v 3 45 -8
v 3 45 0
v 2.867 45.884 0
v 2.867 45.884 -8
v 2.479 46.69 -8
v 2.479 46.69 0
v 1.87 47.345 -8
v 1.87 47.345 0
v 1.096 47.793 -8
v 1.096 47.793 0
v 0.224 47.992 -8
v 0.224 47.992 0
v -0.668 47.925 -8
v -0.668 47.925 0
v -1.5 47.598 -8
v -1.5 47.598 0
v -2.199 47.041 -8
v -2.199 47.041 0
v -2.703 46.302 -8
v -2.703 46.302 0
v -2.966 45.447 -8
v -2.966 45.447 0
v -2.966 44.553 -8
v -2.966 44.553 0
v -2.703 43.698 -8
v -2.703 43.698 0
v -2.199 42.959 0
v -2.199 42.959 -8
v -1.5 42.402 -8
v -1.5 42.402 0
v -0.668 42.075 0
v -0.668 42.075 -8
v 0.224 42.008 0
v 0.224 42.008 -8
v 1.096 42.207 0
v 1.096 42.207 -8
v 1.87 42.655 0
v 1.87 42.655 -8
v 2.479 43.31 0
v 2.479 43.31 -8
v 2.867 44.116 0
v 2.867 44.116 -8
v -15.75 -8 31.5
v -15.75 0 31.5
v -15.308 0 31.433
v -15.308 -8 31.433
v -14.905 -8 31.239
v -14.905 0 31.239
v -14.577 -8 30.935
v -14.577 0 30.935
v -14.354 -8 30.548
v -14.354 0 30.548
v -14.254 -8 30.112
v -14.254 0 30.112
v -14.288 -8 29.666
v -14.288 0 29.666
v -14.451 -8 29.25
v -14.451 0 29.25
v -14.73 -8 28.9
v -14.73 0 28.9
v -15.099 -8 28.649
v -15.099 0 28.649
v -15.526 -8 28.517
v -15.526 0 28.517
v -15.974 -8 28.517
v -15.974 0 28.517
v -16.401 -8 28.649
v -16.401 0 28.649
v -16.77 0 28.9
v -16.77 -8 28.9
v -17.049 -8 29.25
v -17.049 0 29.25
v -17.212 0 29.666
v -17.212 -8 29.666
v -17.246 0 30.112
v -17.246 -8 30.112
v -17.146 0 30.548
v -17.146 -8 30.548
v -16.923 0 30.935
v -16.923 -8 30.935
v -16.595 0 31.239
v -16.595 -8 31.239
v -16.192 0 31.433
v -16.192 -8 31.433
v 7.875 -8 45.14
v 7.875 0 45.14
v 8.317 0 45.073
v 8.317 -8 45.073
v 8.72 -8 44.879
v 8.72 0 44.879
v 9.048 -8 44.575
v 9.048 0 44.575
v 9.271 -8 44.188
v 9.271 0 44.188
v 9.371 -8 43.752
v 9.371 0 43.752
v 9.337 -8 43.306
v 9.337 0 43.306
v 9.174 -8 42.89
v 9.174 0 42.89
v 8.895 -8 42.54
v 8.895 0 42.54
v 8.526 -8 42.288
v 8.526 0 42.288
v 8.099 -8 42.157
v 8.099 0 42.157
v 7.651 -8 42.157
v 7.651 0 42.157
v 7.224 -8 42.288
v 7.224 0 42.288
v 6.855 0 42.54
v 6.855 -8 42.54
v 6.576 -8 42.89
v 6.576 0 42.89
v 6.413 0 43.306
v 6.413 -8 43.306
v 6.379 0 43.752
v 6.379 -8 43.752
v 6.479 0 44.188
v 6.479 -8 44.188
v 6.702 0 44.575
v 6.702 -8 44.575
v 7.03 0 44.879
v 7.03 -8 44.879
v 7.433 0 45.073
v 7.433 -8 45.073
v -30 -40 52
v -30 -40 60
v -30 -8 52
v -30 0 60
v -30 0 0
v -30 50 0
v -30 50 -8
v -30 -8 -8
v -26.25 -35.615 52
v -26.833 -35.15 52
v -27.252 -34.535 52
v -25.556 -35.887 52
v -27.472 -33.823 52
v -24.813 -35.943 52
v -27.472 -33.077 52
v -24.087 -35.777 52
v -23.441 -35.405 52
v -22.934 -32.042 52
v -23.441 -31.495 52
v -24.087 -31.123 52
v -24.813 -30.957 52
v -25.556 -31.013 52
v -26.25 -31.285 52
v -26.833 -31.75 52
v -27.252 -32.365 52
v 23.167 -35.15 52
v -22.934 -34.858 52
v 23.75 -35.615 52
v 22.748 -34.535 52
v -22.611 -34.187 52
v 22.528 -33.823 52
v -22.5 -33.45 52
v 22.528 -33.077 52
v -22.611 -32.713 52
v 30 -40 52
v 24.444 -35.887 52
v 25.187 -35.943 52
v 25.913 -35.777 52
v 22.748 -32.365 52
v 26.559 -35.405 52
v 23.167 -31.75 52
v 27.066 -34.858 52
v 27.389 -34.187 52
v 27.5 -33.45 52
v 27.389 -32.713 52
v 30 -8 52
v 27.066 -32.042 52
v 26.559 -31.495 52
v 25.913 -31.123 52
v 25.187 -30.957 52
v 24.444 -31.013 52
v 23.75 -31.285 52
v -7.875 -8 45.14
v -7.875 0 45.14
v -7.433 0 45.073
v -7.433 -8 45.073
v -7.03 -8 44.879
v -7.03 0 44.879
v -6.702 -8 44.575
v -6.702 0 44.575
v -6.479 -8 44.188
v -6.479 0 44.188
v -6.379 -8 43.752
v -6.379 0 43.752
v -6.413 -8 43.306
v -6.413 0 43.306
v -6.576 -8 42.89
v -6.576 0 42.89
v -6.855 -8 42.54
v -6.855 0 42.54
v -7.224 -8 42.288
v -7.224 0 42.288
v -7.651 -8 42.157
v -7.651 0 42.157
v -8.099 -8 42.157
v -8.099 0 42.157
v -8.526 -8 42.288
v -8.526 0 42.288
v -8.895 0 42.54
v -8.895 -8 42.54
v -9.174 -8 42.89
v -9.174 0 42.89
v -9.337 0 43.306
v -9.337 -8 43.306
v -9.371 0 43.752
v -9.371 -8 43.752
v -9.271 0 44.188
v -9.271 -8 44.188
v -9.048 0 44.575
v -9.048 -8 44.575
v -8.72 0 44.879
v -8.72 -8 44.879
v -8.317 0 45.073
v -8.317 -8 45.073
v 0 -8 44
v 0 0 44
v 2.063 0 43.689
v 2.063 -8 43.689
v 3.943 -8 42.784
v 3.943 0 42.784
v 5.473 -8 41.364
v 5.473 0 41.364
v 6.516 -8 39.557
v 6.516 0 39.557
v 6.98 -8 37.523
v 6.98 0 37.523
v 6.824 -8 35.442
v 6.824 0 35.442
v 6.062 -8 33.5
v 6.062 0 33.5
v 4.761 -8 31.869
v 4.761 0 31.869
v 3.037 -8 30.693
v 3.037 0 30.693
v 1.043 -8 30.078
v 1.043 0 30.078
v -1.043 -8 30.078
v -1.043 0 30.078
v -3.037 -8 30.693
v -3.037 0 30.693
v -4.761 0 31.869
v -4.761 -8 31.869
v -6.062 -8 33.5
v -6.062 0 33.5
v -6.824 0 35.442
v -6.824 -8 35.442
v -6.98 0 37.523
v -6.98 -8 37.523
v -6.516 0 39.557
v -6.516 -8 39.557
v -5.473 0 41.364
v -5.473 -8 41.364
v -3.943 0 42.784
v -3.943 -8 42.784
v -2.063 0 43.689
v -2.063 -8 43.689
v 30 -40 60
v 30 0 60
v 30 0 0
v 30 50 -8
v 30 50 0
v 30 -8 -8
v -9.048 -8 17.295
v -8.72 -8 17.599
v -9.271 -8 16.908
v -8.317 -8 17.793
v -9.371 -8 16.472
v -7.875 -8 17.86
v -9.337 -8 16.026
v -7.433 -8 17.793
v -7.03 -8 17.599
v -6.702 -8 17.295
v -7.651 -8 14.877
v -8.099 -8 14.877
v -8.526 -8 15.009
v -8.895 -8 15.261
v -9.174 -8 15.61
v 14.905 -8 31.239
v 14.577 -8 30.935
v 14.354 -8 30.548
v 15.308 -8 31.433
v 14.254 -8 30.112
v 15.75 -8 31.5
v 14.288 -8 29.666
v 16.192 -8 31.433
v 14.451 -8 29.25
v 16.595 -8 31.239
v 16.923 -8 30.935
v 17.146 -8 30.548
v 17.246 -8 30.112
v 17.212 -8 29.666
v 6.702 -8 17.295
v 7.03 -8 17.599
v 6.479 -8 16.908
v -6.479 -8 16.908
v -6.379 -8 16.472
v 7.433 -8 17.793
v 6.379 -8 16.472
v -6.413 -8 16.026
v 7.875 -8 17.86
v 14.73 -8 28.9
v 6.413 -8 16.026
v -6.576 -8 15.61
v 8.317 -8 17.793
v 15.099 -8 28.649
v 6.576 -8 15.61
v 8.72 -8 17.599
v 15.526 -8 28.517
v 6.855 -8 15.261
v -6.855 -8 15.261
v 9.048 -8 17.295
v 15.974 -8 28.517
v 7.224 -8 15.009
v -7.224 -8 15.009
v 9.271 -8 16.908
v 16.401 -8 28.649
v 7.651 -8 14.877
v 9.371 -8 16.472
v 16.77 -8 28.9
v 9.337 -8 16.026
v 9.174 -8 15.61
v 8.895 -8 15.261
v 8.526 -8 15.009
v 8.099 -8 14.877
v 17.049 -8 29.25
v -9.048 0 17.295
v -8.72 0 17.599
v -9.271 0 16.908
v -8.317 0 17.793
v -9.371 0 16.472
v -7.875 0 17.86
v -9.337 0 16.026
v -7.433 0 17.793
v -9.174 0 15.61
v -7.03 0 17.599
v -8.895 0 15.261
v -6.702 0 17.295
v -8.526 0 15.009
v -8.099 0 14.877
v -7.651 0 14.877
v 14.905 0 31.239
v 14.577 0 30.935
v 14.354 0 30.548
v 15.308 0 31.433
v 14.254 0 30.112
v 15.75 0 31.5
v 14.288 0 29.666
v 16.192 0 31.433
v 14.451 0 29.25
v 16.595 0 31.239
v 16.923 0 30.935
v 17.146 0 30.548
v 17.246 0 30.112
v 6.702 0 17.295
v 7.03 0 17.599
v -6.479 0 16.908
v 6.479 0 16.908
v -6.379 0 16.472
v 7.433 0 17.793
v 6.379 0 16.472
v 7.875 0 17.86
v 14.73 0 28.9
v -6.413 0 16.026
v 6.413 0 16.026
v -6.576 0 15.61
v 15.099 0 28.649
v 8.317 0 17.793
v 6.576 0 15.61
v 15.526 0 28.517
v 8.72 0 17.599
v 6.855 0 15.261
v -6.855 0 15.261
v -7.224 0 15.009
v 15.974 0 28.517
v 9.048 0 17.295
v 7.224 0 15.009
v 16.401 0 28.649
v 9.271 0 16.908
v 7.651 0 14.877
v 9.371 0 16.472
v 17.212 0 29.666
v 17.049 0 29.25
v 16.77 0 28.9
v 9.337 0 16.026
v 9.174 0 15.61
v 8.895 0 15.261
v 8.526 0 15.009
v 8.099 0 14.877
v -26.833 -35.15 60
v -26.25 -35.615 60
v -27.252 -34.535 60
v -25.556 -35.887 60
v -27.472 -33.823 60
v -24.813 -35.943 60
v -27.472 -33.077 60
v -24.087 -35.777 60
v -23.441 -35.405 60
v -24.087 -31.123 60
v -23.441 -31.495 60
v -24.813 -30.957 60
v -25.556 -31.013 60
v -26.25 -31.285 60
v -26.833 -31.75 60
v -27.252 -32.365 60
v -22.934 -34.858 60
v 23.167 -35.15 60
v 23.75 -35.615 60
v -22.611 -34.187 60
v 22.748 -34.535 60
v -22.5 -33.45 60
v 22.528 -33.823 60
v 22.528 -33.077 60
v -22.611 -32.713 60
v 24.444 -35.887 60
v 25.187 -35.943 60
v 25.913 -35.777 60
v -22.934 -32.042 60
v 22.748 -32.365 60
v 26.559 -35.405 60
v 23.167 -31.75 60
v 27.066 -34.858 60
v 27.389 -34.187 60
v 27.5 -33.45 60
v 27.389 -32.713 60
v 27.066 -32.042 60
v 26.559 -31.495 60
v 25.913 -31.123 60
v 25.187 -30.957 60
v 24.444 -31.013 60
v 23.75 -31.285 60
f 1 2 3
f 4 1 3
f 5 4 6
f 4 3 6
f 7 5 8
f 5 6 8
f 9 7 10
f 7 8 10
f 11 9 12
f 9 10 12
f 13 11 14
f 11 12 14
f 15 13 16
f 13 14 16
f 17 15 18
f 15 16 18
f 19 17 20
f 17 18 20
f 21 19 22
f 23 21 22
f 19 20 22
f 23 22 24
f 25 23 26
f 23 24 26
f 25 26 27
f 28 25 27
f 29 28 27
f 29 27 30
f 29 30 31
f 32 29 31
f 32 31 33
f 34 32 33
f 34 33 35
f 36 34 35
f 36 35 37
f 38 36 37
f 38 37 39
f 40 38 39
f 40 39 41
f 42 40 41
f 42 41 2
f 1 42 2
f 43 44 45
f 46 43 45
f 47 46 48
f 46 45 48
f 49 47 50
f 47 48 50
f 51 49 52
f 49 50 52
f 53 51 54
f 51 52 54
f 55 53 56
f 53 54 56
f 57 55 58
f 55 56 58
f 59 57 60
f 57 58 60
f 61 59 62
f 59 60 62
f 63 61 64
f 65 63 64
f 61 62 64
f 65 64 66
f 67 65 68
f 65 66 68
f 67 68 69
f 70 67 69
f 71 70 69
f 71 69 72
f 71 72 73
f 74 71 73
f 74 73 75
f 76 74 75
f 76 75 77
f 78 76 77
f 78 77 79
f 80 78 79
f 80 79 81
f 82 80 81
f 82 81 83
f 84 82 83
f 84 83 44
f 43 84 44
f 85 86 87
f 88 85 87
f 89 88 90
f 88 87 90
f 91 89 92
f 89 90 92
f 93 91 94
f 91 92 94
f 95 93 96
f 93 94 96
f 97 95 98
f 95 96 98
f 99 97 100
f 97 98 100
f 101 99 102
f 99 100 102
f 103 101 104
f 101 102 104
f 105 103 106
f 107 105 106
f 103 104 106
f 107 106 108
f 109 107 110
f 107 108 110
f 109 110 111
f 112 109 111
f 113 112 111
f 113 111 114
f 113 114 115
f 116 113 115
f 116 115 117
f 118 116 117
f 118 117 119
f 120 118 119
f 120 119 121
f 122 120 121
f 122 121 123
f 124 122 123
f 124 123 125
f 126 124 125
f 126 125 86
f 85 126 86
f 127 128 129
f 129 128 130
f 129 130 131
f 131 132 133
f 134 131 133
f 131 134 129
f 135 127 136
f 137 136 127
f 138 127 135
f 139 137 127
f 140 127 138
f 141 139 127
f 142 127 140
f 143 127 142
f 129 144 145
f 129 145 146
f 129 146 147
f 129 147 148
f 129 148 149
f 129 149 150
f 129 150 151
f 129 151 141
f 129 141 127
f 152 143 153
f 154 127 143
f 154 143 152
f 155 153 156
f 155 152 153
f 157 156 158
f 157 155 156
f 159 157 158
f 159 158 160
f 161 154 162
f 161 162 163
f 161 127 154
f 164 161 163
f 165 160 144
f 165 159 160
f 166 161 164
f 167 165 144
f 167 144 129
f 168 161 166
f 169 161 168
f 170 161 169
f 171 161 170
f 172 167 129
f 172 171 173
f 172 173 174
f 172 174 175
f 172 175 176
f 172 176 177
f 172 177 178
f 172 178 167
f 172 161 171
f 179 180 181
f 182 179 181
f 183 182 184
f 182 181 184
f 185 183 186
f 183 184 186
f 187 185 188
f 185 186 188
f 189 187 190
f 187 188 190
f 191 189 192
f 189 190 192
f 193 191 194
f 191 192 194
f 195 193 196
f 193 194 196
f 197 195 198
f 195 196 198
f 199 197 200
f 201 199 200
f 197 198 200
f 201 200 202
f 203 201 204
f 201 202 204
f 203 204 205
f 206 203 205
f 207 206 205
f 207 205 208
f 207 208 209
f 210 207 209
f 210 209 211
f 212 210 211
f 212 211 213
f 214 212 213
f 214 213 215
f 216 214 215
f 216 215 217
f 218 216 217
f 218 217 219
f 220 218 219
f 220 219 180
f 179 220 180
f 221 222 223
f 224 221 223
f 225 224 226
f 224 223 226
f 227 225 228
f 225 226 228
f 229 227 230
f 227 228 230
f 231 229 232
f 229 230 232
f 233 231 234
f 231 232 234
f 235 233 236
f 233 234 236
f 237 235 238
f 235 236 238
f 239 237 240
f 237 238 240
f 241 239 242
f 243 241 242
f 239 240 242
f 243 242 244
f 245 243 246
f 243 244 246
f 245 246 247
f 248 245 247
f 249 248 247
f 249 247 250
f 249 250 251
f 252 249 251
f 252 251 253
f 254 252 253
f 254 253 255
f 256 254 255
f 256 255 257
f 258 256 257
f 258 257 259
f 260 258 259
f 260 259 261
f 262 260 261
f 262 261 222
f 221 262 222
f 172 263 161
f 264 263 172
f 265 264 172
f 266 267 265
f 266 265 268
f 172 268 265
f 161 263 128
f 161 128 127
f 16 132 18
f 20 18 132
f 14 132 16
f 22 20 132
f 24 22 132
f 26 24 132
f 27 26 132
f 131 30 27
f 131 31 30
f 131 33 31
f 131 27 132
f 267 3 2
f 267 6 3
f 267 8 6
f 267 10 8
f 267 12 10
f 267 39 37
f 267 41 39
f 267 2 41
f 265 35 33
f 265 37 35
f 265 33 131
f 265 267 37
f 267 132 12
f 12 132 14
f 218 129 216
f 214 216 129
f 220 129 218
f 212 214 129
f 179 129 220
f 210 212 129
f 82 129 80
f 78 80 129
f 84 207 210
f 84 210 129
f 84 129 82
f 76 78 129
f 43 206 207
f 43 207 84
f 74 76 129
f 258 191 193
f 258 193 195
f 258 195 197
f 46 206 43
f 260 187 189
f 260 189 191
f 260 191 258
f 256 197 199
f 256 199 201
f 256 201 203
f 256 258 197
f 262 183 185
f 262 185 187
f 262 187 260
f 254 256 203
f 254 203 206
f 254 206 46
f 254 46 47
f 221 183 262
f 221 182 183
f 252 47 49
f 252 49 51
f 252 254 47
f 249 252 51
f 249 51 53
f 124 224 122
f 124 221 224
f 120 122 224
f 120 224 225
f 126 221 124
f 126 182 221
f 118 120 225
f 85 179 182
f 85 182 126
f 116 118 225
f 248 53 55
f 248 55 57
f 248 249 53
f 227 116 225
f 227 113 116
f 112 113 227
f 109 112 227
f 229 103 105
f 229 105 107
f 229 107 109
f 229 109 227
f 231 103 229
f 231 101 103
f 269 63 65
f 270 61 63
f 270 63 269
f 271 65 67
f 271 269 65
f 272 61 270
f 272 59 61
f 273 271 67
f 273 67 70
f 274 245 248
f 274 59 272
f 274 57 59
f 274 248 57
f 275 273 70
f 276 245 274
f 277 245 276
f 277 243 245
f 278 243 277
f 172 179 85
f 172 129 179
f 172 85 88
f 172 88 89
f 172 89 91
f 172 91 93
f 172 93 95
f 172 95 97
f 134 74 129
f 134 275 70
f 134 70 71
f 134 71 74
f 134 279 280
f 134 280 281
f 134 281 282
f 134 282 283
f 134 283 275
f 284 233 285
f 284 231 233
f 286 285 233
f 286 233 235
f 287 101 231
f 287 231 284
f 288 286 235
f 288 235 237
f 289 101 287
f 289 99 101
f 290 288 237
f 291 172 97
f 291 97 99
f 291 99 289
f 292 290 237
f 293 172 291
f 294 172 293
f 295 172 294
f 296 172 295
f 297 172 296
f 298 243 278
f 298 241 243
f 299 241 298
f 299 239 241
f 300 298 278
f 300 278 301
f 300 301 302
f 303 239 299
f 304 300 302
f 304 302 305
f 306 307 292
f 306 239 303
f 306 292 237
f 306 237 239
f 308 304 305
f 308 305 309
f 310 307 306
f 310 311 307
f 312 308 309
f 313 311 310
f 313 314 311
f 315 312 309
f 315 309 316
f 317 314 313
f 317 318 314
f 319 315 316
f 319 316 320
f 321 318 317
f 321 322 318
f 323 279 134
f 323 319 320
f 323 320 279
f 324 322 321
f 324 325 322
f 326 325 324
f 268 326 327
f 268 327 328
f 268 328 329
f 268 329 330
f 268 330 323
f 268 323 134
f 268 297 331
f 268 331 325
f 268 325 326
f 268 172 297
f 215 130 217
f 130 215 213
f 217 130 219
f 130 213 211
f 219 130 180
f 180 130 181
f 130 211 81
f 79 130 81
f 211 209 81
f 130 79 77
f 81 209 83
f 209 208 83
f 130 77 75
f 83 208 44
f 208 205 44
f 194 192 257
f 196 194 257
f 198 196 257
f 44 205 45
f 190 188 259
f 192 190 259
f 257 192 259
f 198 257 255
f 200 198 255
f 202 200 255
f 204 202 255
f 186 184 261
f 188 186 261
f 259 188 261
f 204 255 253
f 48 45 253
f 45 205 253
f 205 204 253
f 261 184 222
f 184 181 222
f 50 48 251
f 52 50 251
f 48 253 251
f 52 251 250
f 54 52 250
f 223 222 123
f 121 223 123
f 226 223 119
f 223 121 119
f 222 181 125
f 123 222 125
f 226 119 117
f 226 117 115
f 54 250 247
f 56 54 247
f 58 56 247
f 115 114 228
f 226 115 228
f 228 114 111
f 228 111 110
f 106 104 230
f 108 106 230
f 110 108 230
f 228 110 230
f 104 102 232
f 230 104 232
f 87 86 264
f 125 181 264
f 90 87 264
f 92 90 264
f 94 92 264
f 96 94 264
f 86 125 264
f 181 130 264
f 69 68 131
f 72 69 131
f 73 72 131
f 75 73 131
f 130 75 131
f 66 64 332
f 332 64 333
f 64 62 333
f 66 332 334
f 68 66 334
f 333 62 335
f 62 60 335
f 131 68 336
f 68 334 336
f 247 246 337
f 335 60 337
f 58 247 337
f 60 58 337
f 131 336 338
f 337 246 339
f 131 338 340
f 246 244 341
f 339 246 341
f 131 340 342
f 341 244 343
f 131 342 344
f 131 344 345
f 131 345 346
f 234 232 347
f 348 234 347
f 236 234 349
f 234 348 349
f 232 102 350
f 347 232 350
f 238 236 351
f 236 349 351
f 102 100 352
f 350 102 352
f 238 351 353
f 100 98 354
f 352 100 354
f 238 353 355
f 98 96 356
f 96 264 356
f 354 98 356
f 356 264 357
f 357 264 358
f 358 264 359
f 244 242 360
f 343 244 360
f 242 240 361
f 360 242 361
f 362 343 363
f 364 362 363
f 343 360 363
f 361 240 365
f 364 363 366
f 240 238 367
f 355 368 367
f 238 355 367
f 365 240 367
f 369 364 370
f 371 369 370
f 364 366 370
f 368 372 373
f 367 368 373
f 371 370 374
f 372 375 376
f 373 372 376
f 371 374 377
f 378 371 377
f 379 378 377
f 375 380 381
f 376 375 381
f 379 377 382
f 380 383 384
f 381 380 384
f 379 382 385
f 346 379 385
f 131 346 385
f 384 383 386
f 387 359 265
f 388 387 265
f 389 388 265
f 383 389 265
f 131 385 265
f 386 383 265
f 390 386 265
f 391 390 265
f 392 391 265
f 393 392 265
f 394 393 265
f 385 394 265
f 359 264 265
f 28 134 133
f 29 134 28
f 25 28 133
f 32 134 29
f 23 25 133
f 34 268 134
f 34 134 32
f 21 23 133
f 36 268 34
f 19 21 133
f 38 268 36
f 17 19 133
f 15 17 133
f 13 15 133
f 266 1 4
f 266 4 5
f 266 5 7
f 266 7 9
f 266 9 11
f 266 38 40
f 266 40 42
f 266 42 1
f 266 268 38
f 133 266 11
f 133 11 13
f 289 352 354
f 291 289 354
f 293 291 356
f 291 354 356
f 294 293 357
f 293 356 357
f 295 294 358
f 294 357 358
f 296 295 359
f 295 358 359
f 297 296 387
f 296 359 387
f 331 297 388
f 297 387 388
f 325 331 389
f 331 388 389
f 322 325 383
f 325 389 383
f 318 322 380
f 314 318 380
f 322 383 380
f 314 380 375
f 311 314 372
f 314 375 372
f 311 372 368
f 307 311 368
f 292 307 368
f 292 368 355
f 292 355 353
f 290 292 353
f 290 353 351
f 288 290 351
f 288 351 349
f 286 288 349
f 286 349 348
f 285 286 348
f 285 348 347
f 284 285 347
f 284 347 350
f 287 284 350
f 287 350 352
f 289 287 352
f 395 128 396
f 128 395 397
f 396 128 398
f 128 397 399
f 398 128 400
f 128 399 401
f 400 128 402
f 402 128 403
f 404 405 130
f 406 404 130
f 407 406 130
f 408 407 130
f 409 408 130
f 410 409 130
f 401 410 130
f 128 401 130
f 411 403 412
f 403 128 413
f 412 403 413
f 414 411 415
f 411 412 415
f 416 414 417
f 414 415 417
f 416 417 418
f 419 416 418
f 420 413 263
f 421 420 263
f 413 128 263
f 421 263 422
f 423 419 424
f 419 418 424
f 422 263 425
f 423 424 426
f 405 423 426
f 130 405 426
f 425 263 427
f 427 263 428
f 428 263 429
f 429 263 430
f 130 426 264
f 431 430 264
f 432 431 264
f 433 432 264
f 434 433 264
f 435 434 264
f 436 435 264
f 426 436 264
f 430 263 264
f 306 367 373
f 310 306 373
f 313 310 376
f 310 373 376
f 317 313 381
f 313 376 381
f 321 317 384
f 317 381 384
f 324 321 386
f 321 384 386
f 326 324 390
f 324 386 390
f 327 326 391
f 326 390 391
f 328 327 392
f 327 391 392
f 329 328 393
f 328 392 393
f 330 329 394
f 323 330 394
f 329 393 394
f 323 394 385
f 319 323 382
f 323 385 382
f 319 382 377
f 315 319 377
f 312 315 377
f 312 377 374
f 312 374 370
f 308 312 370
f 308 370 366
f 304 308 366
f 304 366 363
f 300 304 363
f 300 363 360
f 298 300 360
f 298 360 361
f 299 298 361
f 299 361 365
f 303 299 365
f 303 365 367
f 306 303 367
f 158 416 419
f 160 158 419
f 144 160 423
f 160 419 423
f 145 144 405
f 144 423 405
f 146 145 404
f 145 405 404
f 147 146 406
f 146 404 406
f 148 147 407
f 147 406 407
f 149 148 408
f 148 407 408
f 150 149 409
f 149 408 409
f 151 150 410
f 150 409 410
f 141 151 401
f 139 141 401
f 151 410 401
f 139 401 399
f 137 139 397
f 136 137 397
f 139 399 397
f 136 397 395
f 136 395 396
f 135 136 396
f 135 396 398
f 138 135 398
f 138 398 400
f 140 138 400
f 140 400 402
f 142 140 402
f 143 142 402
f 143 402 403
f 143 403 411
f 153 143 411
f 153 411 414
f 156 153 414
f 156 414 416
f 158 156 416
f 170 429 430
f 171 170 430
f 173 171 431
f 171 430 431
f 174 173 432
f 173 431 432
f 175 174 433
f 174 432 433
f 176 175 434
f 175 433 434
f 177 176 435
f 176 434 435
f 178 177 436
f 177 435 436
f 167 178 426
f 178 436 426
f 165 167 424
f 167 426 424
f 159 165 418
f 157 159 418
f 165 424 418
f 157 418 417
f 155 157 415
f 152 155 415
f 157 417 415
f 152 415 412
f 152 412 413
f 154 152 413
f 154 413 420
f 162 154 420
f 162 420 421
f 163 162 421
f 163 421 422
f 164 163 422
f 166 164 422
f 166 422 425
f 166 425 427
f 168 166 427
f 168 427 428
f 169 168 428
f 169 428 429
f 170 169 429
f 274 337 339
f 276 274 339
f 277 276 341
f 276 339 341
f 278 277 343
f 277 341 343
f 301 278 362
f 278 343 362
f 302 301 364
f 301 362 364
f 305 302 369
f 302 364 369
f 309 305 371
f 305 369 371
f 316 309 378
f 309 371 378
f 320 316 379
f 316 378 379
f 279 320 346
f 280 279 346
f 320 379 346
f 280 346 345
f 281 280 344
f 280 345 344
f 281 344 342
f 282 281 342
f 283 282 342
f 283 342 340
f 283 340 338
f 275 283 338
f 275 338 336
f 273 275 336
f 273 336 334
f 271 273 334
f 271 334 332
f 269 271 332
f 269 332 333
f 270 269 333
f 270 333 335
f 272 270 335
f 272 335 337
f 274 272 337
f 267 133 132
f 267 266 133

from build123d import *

# Parameters (mm, degrees)
BOSS_EXTRUDE1_DEPTH = 30
SKETCH2_R           = 7
SKETCH2_R_2         = 1.5
CUT_EXTRUDE1_DEPTH  = 55
SKETCH3_R           = 3
CUT_EXTRUDE2_DEPTH  = 55
SKETCH4_W           = 8
SKETCH4_H           = 40
BOSS_EXTRUDE2_DEPTH = 60
SKETCH5_R           = 2.5
CUT_EXTRUDE3_DEPTH  = 10


with BuildPart() as part:
    # Sketch1 → Boss-Extrude1 (new, symmetric)
    with BuildSketch(Plane(origin=(0, 0, 0), x_dir=(0, 0, -1), z_dir=(1, 0, 0))):
        Polygon((0, 50), (0, 0), (-52, 0), (-52, -8), (8, -8), (8, 50), align=None)
    extrude(amount=BOSS_EXTRUDE1_DEPTH, both=True)

    # Sketch2 → Cut-Extrude1 (cut)
    with BuildSketch(Plane(origin=(0, 0, 0), x_dir=(1, 0, 0), z_dir=(0, 1, 0))):
        with Locations(Location((0, -37, 0), (0, 0, 270))):
            Circle(SKETCH2_R)
        with Locations(Location((15.75, -30, 0), (0, 0, 270))):
            Circle(SKETCH2_R_2)
        with Locations(Location((7.875, -43.63990011, 0), (0, 0, 270))):
            Circle(SKETCH2_R_2)
        with Locations(Location((-7.875, -43.63990011, 0), (0, 0, 270))):
            Circle(SKETCH2_R_2)
        with Locations(Location((-15.75, -30, 0), (0, 0, 270))):
            Circle(SKETCH2_R_2)
        with Locations(Location((-7.875, -16.36009989, 0), (0, 0, 270))):
            Circle(SKETCH2_R_2)
        with Locations(Location((7.875, -16.36009989, 0), (0, 0, 270))):
            Circle(SKETCH2_R_2)
    extrude(amount=-CUT_EXTRUDE1_DEPTH, mode=Mode.SUBTRACT)

    # Sketch3 → Cut-Extrude2 (cut)
    with BuildSketch(Plane.XY):
        with Locations((0, 45)):
            Circle(SKETCH3_R)
    extrude(amount=-CUT_EXTRUDE2_DEPTH, mode=Mode.SUBTRACT)

    # Sketch4 → Boss-Extrude2 (add)
    with BuildSketch(Plane(origin=(30, 0, 0), x_dir=(0, 0, -1), z_dir=(1, 0, 0))):
        with Locations((-56, -20)):
            Rectangle(SKETCH4_W, SKETCH4_H)
    extrude(amount=-BOSS_EXTRUDE2_DEPTH)

    # Sketch5 → Cut-Extrude3 (cut)
    with BuildSketch(Plane.XY.offset(60)):
        with Locations((25, -33.45)):
            Circle(SKETCH5_R)
        with Locations((-25, -33.45)):
            Circle(SKETCH5_R)
    extrude(amount=-CUT_EXTRUDE3_DEPTH, mode=Mode.SUBTRACT)


solid = part.part
